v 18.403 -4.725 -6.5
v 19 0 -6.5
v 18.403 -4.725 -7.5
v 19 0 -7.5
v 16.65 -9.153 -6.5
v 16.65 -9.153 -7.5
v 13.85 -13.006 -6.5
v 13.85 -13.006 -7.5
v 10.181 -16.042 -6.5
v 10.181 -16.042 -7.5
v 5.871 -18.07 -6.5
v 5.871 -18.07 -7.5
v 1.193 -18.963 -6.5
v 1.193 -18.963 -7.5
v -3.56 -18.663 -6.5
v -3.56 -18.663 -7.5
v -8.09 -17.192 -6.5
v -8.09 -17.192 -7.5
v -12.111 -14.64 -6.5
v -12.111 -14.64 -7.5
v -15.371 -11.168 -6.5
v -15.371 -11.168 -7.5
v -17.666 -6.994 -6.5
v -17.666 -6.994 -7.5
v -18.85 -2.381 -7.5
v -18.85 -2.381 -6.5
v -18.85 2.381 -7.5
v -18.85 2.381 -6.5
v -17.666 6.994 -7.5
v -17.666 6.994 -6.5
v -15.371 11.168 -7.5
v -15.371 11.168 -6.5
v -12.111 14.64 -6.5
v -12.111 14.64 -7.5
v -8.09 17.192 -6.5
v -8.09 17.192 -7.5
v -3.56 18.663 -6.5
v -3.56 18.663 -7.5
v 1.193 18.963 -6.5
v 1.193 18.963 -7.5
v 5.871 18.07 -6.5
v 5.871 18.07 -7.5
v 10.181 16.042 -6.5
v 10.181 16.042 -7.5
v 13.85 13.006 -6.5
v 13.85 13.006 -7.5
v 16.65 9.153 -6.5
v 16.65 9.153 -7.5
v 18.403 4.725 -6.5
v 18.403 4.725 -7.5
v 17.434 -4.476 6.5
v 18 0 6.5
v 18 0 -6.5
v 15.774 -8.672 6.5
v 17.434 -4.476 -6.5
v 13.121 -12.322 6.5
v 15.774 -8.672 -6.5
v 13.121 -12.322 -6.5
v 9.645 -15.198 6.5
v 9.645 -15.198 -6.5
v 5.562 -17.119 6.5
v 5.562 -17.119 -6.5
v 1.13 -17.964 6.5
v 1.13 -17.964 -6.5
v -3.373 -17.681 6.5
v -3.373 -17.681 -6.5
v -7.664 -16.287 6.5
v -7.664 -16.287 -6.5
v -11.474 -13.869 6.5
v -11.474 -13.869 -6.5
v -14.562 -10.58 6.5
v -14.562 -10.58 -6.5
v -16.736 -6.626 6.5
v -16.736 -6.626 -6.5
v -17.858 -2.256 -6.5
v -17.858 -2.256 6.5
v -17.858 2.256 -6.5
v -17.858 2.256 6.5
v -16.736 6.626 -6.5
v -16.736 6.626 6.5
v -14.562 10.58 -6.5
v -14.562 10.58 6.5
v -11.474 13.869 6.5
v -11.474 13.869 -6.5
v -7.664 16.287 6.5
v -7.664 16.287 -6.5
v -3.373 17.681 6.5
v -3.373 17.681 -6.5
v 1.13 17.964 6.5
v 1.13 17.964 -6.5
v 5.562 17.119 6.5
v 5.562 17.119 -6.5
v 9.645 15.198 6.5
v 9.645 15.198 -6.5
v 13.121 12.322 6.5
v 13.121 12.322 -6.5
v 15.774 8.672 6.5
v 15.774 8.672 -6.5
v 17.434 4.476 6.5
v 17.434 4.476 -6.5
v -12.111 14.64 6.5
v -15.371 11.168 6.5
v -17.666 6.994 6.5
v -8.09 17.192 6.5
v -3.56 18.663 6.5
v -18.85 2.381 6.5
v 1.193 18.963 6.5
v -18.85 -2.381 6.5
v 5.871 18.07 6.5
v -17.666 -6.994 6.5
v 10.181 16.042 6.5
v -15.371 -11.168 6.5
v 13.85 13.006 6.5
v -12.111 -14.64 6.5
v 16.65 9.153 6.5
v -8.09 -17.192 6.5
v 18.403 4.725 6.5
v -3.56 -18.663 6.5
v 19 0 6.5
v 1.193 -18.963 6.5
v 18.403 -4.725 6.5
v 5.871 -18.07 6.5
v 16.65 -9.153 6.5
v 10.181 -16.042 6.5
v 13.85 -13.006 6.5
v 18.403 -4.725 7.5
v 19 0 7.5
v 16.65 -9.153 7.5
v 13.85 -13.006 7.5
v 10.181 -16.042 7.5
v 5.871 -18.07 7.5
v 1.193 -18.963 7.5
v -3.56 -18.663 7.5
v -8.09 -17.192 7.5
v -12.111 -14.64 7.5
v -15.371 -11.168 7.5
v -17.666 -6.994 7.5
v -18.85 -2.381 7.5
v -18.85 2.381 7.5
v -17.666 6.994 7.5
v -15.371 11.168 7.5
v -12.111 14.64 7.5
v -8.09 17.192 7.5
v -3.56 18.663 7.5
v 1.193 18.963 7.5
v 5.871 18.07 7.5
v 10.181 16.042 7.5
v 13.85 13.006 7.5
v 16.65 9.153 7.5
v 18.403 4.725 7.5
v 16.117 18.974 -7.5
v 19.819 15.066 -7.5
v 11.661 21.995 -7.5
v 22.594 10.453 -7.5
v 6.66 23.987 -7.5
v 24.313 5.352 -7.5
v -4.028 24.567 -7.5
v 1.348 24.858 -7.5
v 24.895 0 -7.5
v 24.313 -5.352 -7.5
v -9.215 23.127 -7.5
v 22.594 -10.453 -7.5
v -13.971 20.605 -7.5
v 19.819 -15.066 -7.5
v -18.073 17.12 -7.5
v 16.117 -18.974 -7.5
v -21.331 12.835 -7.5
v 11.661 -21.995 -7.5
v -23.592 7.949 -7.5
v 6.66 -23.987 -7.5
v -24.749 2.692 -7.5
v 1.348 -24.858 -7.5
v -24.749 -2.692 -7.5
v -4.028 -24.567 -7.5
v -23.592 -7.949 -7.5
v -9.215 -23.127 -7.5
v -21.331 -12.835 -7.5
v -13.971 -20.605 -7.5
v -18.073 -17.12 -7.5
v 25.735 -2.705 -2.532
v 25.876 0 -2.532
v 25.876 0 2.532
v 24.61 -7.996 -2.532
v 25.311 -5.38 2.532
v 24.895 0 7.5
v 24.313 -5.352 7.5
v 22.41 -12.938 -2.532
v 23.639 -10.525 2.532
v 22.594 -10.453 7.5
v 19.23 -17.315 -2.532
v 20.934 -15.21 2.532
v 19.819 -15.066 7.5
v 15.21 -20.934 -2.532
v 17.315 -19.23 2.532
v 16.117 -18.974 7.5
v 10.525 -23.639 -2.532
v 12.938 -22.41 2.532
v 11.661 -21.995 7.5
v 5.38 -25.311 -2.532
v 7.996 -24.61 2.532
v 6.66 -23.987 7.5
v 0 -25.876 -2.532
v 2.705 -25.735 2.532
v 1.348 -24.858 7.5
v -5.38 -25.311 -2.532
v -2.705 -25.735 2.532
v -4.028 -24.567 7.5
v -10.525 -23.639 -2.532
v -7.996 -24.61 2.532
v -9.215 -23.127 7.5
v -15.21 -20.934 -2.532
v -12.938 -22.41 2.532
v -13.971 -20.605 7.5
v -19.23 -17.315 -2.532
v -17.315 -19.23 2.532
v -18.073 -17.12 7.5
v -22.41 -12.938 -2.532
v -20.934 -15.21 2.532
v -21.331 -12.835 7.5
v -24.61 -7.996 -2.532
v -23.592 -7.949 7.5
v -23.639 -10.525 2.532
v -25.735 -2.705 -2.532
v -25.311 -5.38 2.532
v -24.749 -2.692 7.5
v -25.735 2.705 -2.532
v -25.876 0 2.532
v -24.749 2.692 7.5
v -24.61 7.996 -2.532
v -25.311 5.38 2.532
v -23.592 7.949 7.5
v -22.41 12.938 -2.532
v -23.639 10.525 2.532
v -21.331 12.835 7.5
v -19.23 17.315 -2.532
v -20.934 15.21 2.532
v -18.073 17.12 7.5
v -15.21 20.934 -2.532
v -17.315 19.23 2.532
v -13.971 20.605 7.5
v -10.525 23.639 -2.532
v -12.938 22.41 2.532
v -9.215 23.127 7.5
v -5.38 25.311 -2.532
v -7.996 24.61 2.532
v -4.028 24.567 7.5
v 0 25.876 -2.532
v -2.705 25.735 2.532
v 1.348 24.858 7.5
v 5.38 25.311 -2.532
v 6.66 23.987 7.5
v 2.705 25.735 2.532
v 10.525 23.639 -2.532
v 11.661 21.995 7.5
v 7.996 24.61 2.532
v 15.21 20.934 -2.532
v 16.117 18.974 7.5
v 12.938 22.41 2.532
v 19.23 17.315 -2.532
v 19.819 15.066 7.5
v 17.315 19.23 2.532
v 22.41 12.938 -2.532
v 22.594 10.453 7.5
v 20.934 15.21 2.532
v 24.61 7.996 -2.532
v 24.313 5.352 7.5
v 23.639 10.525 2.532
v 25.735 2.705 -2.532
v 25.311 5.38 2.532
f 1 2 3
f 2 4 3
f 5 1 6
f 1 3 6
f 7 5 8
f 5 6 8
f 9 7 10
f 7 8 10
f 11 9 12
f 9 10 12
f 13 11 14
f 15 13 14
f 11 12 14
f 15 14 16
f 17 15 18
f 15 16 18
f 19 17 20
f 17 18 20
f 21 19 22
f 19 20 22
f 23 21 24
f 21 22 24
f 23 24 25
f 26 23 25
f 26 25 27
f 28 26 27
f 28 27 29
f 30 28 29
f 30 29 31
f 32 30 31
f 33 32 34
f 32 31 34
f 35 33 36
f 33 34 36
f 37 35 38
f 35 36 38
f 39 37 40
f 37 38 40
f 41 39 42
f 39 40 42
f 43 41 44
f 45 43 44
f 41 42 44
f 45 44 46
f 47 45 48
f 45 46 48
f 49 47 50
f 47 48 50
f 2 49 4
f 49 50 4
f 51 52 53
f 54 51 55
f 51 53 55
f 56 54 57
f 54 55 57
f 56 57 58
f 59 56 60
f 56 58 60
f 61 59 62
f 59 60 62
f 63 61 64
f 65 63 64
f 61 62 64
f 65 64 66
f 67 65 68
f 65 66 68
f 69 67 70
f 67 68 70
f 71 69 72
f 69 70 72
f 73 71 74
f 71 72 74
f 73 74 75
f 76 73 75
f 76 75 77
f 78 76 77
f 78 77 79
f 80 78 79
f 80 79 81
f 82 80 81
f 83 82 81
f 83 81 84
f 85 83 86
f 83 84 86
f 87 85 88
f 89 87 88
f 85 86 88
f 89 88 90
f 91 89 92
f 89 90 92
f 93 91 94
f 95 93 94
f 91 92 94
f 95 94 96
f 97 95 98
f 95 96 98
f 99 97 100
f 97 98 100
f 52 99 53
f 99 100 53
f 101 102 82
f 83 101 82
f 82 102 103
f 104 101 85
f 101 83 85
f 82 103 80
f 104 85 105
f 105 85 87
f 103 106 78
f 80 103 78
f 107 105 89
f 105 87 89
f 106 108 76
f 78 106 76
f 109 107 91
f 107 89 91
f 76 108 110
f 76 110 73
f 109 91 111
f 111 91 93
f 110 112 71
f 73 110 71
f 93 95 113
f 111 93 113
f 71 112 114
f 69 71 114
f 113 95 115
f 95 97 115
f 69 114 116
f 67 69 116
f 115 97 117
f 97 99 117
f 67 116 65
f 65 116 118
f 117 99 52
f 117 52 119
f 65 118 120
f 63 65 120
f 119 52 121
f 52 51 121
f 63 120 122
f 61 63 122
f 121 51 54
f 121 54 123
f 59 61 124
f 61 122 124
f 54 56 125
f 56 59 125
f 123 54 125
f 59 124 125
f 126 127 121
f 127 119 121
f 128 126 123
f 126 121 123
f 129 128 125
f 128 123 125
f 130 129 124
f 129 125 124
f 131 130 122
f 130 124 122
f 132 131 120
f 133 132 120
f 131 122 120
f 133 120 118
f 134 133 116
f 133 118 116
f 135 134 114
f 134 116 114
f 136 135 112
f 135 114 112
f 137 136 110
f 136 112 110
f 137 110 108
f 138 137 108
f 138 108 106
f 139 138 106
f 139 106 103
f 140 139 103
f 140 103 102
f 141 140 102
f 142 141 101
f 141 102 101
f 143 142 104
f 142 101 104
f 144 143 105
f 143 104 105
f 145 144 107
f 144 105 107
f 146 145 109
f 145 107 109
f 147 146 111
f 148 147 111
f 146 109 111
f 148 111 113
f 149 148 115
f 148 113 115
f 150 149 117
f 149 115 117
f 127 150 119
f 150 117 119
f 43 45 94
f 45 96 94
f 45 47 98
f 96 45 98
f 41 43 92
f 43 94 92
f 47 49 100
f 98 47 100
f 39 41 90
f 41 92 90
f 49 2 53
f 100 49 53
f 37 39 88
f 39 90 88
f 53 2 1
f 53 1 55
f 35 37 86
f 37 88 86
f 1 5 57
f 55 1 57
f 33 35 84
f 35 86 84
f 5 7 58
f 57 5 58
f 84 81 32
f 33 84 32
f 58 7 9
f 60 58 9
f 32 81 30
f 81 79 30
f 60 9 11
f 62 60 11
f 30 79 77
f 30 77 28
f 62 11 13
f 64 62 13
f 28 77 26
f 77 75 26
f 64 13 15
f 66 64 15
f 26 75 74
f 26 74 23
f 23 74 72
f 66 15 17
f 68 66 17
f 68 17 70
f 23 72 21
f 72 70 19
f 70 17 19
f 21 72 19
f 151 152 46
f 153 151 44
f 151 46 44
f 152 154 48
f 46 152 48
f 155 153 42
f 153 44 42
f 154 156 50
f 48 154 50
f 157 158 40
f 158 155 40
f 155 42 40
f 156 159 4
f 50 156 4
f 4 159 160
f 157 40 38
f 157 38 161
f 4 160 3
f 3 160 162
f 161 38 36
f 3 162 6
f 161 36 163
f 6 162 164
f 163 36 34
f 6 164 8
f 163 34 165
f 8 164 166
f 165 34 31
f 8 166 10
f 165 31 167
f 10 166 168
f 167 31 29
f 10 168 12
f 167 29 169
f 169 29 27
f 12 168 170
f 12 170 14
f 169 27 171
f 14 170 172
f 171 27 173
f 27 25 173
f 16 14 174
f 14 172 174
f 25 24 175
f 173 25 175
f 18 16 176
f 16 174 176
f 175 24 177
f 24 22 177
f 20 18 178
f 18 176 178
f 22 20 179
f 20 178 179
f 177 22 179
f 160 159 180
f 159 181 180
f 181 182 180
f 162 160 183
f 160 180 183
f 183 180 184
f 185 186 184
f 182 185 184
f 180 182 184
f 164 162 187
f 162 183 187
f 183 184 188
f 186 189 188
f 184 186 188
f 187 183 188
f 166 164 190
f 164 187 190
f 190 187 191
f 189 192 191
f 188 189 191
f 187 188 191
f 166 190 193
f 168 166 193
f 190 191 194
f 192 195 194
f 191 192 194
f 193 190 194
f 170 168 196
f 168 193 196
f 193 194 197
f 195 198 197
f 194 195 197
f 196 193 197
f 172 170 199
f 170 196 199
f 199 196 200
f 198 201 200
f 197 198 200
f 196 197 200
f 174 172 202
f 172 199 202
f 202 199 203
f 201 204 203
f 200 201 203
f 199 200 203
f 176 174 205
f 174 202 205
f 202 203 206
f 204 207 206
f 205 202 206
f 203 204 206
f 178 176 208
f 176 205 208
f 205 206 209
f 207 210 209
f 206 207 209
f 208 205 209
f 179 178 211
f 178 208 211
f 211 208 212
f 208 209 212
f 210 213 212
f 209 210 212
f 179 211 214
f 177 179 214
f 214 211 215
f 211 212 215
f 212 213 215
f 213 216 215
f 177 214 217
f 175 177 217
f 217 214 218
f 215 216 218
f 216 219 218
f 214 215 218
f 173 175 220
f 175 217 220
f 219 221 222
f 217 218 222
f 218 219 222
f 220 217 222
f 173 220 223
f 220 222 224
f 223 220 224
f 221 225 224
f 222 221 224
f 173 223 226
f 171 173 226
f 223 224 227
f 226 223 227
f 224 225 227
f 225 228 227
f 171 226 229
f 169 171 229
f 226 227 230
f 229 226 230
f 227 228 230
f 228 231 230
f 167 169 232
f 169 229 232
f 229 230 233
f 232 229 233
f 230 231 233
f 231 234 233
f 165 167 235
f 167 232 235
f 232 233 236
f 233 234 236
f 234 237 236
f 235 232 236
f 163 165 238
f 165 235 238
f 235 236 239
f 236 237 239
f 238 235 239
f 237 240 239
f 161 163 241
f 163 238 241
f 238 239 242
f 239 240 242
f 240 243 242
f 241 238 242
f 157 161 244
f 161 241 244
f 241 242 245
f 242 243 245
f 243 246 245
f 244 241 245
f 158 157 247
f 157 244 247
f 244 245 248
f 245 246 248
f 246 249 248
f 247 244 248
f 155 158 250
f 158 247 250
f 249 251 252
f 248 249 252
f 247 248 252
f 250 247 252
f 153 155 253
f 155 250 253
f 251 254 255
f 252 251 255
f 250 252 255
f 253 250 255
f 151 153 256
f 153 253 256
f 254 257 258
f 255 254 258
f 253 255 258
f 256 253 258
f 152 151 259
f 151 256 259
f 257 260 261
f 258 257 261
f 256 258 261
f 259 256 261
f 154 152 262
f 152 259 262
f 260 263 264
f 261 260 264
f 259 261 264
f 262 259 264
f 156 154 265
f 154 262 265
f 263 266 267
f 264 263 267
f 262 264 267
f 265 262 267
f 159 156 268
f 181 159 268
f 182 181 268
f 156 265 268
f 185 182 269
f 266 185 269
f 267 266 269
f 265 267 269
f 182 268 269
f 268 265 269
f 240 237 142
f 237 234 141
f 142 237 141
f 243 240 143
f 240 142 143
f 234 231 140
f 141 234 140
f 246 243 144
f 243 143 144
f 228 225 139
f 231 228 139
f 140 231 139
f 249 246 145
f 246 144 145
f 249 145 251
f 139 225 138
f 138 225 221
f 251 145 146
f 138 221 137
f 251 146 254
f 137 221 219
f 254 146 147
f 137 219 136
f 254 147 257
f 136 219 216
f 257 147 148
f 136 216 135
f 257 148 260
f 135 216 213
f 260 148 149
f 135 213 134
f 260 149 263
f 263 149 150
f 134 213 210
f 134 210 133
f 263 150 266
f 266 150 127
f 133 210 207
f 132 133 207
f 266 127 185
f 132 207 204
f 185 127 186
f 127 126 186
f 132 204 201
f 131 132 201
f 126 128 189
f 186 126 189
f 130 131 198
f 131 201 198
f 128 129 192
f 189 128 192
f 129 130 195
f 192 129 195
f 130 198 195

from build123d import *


with BuildPart() as part:
    # Esquisse1 → Révolution1 (revolve)
    with BuildSketch(Plane(origin=(0, 0, 0), x_dir=(0, 0, -1), z_dir=(1, 0, 0)), mode=Mode.PRIVATE) as r_volution1_sk:
        with BuildLine():
            Line((-6.5, 18), (6.5, 18))
            Line((6.5, 18), (6.5, 19))
            Line((6.5, 19), (7.5, 19))
            Line((7.5, 19), (7.5, 24.894778569))
            ThreePointArc((7.5, 24.894778569), (0, 26), (-7.5, 24.894778569))
            Line((-7.5, 24.894778569), (-7.5, 19))
            Line((-7.5, 19), (-6.5, 19))
            Line((-6.5, 19), (-6.5, 18))
        make_face()
    revolve(r_volution1_sk.sketch.rotate(Axis((0, 0, 2.4656375), (0, 0, -1)), 90), axis=Axis((0, 0, 2.4656375), (0, 0, -1)))


solid = part.part
